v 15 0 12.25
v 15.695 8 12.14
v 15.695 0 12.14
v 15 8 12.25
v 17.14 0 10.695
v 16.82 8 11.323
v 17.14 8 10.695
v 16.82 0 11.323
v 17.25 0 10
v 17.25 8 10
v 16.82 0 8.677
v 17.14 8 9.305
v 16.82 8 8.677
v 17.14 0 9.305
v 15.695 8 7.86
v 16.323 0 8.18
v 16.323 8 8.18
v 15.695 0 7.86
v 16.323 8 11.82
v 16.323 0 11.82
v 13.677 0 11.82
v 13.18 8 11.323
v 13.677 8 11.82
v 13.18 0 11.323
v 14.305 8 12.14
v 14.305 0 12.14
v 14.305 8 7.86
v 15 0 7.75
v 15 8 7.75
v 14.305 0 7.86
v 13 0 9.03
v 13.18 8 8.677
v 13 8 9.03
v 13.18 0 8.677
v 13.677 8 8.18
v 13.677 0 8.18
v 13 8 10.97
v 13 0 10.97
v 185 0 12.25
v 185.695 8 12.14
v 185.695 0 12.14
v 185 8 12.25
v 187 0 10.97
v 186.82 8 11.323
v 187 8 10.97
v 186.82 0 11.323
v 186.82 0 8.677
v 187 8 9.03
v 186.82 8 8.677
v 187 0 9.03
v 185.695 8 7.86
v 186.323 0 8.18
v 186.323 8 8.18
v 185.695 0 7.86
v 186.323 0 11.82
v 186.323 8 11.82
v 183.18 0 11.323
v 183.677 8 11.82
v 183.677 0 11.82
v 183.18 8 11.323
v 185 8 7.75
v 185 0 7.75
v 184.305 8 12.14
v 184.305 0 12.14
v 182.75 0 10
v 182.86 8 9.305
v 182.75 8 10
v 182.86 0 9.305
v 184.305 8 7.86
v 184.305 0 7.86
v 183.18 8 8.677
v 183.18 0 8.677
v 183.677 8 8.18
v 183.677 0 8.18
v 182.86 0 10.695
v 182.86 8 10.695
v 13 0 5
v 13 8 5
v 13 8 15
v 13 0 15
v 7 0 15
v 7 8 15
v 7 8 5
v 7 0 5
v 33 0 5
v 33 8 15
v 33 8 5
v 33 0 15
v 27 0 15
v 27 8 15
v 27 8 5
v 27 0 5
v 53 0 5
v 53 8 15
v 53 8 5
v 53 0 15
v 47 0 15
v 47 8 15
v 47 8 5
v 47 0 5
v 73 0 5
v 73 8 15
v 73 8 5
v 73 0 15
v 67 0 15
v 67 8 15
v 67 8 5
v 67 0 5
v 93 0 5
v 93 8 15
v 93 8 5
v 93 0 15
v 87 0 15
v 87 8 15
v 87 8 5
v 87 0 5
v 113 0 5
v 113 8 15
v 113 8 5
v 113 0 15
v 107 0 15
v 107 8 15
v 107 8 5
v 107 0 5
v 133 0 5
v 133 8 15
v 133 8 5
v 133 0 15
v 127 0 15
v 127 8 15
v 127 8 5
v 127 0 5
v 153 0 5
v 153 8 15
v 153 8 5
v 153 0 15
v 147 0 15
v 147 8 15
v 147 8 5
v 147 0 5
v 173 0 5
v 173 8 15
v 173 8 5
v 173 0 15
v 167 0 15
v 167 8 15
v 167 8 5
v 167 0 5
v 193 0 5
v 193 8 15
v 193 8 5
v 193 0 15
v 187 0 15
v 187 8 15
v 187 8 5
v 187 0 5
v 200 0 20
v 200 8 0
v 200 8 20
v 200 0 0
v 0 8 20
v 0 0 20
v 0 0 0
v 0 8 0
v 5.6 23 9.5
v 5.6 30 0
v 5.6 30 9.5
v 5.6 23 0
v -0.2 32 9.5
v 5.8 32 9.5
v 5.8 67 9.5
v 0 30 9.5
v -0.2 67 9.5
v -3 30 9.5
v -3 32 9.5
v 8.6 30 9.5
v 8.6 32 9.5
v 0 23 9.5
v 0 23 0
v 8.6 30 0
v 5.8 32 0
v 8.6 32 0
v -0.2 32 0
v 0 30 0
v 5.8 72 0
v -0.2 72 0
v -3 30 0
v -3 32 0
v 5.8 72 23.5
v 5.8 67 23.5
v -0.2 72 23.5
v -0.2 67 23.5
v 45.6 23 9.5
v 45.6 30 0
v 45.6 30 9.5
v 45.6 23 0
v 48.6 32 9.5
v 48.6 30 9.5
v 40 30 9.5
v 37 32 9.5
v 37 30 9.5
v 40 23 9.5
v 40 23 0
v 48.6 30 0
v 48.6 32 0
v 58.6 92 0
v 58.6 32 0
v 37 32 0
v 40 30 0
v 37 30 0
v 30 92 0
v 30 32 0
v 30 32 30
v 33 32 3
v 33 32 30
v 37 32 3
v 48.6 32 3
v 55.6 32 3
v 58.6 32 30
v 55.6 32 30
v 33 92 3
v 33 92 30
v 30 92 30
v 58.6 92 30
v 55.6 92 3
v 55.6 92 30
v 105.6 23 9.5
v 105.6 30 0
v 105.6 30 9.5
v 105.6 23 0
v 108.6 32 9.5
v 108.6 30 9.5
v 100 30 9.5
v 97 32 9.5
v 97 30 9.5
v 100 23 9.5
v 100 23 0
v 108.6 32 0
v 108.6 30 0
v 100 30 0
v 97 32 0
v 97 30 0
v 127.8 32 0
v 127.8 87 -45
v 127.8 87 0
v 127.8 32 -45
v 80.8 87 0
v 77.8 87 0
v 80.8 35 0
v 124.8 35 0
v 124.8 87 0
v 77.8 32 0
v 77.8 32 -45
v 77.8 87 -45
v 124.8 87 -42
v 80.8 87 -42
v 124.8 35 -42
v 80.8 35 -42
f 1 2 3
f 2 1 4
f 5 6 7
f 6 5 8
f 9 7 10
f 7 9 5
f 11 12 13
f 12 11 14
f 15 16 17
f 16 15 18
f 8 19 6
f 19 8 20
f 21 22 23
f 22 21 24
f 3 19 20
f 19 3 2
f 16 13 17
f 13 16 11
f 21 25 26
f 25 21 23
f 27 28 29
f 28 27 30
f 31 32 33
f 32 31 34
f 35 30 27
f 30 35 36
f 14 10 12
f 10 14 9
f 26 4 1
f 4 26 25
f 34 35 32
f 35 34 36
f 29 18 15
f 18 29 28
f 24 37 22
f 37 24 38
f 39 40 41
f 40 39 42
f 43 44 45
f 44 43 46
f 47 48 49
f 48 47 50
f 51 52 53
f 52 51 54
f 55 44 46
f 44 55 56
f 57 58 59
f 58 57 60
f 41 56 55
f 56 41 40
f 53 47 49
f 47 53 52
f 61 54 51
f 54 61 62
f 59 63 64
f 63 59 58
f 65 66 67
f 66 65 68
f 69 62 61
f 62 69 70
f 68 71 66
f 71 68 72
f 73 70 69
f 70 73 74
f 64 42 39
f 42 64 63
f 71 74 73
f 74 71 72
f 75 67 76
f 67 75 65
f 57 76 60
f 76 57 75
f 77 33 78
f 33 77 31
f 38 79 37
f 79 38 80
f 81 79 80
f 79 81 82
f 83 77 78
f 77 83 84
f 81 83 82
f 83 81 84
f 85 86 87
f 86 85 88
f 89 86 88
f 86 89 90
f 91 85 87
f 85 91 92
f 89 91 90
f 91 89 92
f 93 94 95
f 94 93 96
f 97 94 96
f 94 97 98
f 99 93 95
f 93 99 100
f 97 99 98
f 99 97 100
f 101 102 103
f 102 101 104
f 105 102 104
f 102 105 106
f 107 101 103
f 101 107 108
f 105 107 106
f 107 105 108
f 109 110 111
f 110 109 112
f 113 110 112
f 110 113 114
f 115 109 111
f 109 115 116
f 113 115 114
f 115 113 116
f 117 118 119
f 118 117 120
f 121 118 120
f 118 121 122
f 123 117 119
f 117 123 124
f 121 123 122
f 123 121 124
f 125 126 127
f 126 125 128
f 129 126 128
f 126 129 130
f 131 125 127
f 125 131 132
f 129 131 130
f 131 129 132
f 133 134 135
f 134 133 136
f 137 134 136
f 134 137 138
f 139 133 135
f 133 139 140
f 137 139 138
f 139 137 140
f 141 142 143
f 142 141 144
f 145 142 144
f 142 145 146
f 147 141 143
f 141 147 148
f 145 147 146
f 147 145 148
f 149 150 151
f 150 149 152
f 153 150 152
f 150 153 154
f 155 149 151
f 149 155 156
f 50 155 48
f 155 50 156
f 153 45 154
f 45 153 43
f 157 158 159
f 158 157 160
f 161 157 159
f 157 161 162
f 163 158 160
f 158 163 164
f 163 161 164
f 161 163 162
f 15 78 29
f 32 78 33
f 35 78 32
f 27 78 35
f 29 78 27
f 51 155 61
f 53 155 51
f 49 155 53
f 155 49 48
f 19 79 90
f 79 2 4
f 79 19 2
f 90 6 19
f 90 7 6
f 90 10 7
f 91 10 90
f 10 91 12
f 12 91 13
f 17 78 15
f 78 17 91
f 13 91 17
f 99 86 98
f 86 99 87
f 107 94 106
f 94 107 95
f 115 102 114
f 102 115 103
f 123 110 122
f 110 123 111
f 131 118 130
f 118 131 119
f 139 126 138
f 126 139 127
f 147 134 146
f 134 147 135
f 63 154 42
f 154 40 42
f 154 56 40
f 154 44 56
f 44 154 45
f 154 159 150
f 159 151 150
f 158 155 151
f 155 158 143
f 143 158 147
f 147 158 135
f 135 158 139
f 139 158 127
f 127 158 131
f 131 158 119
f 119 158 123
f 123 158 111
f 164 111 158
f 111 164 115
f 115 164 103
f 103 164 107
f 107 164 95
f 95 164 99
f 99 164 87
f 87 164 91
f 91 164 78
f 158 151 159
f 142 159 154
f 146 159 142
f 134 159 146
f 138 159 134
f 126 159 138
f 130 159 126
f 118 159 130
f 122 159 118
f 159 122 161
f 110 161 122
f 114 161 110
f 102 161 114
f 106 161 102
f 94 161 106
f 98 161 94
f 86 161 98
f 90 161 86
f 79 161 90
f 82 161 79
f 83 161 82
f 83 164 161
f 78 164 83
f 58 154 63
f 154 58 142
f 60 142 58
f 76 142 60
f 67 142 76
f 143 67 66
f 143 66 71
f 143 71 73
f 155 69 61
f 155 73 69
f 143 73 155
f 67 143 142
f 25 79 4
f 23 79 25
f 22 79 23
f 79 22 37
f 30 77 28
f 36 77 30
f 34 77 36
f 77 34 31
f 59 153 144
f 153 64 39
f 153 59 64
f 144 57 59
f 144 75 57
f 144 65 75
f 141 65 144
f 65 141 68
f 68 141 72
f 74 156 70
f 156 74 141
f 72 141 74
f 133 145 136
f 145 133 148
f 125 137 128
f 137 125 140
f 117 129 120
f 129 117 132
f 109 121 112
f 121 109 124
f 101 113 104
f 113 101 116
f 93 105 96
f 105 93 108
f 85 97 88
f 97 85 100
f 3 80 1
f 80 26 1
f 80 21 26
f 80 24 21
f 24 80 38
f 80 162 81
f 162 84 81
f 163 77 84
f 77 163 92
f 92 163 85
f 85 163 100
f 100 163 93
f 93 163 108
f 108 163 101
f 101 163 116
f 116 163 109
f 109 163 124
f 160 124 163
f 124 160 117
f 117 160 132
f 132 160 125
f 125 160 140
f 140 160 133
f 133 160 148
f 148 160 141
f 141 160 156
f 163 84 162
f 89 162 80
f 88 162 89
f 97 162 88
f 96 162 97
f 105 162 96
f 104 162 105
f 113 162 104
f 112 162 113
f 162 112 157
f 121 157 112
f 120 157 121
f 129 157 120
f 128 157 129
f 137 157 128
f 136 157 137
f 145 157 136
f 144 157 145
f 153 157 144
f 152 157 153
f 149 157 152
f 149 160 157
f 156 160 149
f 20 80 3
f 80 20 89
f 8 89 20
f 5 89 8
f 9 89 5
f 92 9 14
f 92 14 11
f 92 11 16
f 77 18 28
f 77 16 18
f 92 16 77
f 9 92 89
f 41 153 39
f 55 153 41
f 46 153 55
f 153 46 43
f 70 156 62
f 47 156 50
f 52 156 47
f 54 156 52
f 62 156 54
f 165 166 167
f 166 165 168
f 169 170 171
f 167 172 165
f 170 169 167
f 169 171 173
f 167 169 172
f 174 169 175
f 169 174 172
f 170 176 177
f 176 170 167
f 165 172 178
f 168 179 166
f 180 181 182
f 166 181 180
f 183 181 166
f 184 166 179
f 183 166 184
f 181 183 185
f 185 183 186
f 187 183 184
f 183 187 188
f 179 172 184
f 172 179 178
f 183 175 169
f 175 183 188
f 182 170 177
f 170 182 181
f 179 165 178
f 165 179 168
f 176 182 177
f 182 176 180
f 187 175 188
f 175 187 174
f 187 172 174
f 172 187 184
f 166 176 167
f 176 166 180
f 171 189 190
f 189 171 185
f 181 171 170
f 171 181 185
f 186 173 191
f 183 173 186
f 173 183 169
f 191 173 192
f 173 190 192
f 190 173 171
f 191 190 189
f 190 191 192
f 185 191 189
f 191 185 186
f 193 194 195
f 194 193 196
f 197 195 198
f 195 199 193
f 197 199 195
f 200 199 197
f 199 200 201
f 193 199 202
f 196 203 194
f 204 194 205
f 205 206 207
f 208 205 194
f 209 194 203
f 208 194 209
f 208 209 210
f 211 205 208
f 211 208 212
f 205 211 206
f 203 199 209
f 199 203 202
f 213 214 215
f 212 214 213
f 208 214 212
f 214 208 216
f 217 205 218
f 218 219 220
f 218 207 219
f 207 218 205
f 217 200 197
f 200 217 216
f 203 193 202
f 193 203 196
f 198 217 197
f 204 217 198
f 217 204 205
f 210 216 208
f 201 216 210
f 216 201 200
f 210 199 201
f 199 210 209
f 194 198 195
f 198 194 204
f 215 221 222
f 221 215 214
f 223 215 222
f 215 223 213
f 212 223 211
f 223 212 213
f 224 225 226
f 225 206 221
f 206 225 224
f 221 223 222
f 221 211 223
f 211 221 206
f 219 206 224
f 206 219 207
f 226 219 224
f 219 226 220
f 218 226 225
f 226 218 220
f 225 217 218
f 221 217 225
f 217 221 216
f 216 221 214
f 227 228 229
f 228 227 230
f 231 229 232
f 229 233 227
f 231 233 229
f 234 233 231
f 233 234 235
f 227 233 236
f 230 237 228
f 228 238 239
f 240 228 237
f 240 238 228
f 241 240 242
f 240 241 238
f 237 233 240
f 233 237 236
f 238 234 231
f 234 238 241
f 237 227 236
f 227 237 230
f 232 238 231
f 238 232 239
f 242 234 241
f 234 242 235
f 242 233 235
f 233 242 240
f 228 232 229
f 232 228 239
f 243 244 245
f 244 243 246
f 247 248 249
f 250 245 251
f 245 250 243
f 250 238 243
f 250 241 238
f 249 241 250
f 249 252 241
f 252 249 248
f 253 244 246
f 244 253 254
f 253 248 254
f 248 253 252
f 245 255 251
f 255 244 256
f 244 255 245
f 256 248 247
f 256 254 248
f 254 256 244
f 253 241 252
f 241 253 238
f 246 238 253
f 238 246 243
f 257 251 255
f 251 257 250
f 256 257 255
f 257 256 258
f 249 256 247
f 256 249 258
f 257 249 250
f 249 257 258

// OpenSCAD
// Pegboard-Style Wall Mount Organizer System
// Modular: hooks, shelves, bins — all click into same rail
// PETG (recommended) or PLA — 0.2mm, 4 walls, 20% infill
// One 200mm rail + mix of attachments

RAIL_W   = 200;
RAIL_H   = 20;
RAIL_T   = 8;
SLOT_W   = 6;
SLOT_H   = 10;
SLOT_PITCH = 20;   // Center-to-center spacing
WALL_T   = 3.0;
SCREW_D  = 4.5;   // M4 wall screws

// Attachment lug dimensions
LUG_W    = SLOT_W - 0.4;
LUG_H    = SLOT_H - 0.5;
LUG_T    = RAIL_T + 1;

module rail() {
    difference() {
        cube([RAIL_W, RAIL_T, RAIL_H]);
        // Mounting screw holes
        for (x = [15, RAIL_W - 15])
            translate([x, RAIL_T/2, RAIL_H/2])
                rotate([90, 0, 0])
                    cylinder(d = SCREW_D, h = RAIL_T + 1, center = true, $fn = 20);
        // Slot array
        n_slots = floor((RAIL_W - SLOT_PITCH) / SLOT_PITCH);
        for (i = [0 : n_slots])
            translate([SLOT_PITCH/2 + i * SLOT_PITCH - SLOT_W/2, -1, RAIL_H/2 - SLOT_H/2])
                cube([SLOT_W, RAIL_T + 2, SLOT_H]);
    }
}

module attach_lug() {
    // T-shaped lug that slides into rail slot
    union() {
        cube([LUG_W, LUG_T, LUG_H]);
        translate([-WALL_T, LUG_T - 2, 0])
            cube([LUG_W + WALL_T*2, 2, LUG_H]);
    }
}

module single_hook() {
    union() {
        attach_lug();
        // Hook arm
        translate([LUG_W/2 - 3, LUG_T, 0]) {
            cube([6, 35, LUG_H]);
            // Upward hook tip
            translate([0, 35, 0])
                cube([6, 5, LUG_H + 14]);
        }
    }
}

module mini_shelf(shelf_d) {
    union() {
        attach_lug();
        // Shelf platform
        translate([-10, LUG_T, 0])
            cube([LUG_W + 20, shelf_d, WALL_T]);
        // Side walls
        for (x = [-10, LUG_W + 10])
            translate([x, LUG_T, 0])
                cube([WALL_T, shelf_d, 30]);
    }
}

module bin(w, d, h) {
    union() {
        attach_lug();
        translate([-(w - LUG_W)/2, LUG_T, -h])
        difference() {
            cube([w, d, h]);
            translate([WALL_T, WALL_T, WALL_T])
                cube([w - WALL_T*2, d, h]);
        }
    }
}

// Layout all components for print
rail();
translate([0, RAIL_T + 15, 0])  single_hook();
translate([40, RAIL_T + 15, 0]) mini_shelf(60);
translate([100, RAIL_T + 15, 0]) bin(50, 55, 45);
